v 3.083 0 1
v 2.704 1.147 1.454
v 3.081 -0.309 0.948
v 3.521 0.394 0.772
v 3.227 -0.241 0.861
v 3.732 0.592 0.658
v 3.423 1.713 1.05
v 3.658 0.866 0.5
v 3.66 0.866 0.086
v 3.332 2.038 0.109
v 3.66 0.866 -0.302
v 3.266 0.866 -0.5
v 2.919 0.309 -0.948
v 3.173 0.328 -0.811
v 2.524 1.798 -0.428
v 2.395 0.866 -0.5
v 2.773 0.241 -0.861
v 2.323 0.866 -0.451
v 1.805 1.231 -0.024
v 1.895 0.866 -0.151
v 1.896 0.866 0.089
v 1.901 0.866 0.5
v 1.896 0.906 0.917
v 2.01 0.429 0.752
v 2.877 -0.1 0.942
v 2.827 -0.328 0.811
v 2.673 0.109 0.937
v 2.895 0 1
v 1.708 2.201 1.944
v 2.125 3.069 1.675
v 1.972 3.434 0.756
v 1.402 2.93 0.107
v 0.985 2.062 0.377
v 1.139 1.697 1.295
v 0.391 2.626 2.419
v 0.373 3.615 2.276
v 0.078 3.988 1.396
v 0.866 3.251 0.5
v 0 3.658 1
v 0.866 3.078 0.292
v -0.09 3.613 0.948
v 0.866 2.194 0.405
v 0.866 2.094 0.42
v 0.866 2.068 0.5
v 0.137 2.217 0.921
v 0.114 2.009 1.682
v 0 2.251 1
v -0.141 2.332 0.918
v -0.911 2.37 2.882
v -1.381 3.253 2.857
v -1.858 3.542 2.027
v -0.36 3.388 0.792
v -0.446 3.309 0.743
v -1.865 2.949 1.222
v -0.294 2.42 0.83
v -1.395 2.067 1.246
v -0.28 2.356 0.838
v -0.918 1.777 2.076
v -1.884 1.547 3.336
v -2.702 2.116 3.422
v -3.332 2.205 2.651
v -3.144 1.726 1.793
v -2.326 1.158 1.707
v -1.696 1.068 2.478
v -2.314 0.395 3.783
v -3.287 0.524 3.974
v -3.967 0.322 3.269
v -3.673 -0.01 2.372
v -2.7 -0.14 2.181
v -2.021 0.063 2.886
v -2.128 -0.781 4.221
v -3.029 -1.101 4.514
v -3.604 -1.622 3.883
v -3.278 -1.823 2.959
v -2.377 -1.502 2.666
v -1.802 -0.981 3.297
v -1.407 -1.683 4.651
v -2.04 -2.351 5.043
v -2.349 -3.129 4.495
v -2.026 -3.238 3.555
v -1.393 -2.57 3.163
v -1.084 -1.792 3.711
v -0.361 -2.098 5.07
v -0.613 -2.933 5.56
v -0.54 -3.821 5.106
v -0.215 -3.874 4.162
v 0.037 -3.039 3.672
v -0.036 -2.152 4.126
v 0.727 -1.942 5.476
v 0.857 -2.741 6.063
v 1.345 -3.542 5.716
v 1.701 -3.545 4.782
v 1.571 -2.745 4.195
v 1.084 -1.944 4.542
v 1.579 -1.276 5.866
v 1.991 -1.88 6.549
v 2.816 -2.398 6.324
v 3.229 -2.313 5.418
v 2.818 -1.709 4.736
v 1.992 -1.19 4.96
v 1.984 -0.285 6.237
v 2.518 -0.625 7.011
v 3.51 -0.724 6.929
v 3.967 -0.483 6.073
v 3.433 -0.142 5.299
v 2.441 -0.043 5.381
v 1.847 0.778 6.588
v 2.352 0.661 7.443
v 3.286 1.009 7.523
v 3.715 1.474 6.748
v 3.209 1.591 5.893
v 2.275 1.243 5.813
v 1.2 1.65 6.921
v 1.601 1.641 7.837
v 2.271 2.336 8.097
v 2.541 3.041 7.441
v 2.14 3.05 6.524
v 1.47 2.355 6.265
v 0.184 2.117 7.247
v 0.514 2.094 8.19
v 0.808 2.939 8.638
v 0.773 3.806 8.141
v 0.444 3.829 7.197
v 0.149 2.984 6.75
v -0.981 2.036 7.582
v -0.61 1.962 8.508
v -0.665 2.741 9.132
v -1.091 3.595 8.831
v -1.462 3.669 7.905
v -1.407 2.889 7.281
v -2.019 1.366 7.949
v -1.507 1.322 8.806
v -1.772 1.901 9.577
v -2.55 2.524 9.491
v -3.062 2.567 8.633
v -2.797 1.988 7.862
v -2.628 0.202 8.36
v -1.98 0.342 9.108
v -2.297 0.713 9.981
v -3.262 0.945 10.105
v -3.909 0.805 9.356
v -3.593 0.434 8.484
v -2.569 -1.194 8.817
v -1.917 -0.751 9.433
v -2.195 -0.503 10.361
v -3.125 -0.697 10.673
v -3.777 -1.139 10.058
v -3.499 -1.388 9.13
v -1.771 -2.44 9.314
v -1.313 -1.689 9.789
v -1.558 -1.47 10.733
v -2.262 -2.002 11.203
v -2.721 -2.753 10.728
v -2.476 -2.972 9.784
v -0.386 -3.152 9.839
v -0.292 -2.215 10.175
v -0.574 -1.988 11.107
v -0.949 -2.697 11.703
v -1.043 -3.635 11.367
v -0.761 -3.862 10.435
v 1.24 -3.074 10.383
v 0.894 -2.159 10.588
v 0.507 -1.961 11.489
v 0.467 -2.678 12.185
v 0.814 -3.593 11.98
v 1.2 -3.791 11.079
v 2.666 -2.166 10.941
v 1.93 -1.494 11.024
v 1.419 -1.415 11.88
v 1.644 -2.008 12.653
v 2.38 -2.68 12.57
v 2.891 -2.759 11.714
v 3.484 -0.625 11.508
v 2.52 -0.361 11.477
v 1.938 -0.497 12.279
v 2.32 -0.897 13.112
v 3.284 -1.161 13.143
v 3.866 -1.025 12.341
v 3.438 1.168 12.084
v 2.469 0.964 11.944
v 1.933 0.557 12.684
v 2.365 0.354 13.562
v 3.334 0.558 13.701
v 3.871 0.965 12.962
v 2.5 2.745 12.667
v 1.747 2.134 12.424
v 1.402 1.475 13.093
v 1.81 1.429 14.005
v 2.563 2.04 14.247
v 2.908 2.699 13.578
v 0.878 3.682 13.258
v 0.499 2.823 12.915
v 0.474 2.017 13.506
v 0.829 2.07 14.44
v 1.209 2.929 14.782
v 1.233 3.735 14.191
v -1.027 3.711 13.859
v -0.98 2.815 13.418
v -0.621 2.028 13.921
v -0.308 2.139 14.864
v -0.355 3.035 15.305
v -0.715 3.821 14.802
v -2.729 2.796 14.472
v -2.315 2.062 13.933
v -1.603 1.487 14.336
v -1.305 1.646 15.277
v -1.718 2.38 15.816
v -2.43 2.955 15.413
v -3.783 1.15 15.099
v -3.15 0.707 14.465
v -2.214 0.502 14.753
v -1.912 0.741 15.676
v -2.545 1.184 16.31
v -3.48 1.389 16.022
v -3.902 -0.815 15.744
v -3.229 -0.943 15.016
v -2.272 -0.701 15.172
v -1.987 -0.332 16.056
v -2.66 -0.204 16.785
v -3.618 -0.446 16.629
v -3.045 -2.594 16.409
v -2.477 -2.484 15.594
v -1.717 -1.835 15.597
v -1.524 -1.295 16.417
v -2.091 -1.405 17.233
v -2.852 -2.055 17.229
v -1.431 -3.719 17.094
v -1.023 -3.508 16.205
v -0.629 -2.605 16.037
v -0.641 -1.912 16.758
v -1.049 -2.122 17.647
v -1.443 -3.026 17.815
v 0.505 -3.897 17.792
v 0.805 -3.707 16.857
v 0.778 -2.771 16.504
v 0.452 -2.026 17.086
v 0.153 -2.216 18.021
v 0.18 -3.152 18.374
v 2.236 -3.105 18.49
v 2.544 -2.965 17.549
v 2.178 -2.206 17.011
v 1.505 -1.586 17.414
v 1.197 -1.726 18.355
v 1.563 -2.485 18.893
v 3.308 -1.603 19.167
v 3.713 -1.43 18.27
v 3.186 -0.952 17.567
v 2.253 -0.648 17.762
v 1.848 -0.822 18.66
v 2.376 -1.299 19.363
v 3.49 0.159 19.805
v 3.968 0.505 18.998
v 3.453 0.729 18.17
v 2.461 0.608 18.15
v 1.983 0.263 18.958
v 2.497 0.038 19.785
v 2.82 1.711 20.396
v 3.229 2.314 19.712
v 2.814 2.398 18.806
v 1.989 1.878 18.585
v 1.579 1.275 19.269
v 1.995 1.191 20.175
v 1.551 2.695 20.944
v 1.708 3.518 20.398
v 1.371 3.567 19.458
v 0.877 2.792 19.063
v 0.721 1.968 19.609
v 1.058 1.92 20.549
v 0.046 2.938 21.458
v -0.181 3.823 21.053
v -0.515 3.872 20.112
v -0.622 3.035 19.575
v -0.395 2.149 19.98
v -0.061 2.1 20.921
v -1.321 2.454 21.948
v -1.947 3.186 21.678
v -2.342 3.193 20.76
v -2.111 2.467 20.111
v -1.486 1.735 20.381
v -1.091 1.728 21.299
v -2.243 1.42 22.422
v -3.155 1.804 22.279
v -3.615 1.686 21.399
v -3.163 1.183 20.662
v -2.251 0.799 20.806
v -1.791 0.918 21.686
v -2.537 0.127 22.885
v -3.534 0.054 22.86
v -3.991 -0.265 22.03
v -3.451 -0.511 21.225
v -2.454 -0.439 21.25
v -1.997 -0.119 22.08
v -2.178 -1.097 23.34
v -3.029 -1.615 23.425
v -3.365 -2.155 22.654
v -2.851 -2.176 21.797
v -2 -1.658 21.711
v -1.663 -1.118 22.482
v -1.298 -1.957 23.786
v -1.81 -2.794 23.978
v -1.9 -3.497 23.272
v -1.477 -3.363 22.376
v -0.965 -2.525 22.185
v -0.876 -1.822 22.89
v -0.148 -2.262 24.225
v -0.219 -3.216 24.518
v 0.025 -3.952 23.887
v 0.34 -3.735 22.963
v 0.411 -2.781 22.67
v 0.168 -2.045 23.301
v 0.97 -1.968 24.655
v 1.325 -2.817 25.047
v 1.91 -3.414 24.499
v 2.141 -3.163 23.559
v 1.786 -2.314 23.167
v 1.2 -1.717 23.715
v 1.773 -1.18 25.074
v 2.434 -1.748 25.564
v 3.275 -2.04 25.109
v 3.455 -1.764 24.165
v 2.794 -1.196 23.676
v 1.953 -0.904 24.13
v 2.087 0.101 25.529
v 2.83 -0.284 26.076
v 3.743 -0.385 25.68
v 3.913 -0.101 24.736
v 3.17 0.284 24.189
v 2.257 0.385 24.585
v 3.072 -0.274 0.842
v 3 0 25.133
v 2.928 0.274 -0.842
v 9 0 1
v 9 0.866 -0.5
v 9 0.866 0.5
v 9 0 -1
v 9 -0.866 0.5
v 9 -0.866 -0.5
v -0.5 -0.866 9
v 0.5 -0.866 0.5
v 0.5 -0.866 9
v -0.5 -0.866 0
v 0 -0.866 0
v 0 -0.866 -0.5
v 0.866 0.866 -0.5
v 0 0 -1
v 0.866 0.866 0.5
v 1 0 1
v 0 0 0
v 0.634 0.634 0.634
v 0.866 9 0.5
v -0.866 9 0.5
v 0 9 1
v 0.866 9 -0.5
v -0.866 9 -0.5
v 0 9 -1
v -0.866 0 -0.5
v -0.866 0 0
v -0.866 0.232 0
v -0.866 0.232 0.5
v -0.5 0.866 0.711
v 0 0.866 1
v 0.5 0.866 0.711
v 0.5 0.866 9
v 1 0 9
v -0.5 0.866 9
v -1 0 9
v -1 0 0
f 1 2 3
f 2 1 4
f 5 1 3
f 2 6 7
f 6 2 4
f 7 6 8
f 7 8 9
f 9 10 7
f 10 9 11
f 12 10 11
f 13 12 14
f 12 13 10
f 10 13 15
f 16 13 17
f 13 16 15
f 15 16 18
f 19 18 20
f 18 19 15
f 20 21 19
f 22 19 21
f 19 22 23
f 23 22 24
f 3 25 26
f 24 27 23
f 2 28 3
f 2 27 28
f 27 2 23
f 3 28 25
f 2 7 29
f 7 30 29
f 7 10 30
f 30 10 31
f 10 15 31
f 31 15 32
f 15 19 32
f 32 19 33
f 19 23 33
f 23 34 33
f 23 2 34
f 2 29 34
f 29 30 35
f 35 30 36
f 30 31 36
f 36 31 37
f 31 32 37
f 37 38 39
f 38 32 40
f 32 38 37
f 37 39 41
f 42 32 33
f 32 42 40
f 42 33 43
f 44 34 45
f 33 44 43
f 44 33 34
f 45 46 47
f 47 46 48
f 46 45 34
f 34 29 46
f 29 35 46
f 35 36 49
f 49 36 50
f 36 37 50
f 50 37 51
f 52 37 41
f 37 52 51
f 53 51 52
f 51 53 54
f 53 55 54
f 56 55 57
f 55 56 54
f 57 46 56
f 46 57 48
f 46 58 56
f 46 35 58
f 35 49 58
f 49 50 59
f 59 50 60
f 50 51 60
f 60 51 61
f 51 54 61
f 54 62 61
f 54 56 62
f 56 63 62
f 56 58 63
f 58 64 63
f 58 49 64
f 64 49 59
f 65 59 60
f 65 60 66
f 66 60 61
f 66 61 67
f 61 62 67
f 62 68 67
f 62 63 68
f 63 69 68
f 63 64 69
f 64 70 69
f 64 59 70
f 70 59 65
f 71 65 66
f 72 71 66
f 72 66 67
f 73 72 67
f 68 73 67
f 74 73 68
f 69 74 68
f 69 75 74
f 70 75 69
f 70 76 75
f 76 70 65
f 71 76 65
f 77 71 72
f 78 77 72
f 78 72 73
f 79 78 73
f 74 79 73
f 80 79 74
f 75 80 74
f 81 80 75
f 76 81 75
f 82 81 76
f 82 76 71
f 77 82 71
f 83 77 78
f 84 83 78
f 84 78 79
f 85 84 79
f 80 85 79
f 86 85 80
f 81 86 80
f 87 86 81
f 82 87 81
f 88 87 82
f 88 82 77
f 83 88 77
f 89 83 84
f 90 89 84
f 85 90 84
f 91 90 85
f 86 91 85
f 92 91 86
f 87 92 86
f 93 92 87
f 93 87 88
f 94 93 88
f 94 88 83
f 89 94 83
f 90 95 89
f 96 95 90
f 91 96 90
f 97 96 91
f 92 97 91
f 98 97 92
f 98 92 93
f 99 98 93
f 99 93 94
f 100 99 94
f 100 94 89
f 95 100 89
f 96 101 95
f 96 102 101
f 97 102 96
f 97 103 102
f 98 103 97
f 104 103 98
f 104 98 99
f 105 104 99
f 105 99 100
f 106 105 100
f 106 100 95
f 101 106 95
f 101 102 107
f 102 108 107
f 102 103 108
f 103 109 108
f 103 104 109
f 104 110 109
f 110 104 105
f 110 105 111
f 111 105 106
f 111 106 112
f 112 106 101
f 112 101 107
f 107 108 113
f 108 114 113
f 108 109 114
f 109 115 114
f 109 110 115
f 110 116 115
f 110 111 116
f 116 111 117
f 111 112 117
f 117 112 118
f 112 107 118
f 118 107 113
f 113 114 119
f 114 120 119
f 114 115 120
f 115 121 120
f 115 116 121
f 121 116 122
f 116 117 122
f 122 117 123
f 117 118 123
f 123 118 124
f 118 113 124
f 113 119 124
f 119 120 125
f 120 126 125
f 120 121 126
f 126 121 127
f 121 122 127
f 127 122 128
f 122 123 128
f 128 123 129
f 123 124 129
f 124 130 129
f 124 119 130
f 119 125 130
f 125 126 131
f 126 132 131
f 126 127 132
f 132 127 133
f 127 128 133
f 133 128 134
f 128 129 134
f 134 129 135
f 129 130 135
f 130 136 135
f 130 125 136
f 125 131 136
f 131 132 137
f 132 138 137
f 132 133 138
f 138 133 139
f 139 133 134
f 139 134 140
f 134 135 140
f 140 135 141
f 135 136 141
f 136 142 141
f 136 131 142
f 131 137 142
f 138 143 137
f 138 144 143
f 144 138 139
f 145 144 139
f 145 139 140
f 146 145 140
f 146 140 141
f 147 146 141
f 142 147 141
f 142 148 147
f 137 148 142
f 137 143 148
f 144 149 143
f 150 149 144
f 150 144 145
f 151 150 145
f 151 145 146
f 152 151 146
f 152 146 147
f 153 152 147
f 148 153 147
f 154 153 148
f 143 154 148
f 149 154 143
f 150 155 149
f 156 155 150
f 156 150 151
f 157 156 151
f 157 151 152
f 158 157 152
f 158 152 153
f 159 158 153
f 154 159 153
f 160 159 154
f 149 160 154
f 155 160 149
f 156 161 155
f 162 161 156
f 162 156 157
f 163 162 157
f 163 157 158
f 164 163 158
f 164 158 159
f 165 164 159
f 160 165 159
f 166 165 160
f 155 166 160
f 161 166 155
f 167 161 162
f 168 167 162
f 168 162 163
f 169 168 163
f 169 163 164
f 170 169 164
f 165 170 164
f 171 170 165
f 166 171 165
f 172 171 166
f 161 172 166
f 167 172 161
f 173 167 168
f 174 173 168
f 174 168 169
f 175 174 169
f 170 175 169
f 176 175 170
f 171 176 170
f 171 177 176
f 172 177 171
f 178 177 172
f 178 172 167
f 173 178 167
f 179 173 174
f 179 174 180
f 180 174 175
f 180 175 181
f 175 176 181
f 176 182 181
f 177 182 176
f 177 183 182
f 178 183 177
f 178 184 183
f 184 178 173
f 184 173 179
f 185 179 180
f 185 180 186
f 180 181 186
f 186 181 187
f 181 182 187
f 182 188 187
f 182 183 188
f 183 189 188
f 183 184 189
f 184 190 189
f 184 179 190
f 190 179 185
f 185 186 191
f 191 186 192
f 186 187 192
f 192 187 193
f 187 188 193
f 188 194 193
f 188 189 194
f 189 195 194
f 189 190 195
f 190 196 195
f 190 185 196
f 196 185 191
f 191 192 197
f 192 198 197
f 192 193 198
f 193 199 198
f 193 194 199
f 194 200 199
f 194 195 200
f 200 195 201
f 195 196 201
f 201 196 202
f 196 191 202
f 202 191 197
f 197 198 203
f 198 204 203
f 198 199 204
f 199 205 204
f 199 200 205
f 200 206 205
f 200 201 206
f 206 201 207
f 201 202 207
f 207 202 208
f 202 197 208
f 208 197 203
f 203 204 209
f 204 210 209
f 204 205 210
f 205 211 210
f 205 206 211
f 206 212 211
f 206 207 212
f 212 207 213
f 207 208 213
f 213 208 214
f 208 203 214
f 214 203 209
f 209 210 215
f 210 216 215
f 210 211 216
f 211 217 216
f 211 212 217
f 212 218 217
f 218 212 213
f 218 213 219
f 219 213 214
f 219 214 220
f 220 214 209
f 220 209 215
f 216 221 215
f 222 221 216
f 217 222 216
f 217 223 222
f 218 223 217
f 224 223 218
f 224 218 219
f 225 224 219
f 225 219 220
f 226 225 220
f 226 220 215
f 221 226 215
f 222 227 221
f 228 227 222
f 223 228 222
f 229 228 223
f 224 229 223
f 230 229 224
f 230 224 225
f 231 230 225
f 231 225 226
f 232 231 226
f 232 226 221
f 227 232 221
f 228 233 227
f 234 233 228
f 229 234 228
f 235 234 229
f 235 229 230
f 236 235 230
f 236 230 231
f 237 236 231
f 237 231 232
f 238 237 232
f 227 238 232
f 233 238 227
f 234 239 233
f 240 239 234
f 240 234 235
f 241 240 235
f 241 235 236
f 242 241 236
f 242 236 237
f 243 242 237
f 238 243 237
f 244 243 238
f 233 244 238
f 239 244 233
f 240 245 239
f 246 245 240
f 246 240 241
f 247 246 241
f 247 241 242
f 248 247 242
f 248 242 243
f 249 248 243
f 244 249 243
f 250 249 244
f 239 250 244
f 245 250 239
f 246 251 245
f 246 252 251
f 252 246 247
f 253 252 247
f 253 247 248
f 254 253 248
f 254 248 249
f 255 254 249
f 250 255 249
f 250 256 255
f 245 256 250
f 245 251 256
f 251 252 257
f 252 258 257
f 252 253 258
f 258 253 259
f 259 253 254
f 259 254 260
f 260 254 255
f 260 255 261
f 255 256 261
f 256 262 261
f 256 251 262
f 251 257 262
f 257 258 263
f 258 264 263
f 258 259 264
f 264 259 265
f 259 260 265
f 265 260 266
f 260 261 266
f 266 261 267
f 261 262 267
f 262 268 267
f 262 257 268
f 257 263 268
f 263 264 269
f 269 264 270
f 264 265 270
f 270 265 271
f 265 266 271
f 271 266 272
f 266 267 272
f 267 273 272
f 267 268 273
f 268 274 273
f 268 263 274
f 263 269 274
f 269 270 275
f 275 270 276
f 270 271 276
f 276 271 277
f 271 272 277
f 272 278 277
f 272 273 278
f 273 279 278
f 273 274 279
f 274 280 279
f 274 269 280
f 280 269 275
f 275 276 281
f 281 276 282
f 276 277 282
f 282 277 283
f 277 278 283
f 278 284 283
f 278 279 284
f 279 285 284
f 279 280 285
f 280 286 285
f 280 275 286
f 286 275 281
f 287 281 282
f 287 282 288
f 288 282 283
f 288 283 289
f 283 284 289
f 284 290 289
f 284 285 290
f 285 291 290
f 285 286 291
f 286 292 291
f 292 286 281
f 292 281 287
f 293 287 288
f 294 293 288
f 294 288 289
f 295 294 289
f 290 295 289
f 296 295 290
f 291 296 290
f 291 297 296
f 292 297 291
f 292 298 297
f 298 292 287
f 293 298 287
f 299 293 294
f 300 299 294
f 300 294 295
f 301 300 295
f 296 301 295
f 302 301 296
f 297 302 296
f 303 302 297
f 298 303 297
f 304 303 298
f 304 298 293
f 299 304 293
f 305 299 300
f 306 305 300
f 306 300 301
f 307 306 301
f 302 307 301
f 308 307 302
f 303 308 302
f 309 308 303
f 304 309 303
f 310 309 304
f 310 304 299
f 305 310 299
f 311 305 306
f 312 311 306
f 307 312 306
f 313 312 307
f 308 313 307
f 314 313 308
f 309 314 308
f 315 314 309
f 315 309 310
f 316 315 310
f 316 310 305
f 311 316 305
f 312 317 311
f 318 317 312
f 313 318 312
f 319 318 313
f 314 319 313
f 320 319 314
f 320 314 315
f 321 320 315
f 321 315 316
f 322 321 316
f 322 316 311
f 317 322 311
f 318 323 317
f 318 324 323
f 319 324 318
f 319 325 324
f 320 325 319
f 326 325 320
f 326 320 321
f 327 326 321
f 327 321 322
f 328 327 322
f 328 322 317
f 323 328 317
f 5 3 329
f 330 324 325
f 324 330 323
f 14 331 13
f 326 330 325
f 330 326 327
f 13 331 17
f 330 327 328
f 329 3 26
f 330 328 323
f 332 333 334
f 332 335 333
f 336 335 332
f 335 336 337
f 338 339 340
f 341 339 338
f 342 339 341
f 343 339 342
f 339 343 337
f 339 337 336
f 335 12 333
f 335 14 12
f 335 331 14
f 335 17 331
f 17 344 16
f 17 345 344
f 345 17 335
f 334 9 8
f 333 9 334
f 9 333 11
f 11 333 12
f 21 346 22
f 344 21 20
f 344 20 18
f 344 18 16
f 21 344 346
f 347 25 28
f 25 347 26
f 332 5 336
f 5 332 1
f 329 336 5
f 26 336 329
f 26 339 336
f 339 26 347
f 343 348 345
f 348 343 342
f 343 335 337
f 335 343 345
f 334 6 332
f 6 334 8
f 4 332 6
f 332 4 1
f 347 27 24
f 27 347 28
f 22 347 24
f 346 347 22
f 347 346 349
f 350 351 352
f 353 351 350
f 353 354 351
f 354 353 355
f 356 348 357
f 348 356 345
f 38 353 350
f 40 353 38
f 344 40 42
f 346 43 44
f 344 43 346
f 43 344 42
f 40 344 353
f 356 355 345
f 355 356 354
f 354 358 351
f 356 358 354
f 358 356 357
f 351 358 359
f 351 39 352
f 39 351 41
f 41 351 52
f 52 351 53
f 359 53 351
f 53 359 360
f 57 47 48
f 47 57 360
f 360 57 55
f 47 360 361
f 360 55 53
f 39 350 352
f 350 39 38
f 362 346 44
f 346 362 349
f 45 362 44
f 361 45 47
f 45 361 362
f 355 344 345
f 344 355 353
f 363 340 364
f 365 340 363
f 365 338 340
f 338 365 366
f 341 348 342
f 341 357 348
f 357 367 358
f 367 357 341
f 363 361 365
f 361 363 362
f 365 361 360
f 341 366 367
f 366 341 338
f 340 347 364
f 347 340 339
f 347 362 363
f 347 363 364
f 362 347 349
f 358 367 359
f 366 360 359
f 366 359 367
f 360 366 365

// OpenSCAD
union() {
	polyhedron(convexity = 10, faces = [[0, 6, 1], [1, 6, 7], [1, 7, 2], [2, 7, 8], [2, 8, 3], [3, 8, 9], [3, 9, 4], [4, 9, 10], [4, 10, 5], [5, 10, 11], [5, 11, 0], [0, 11, 6], [6, 12, 7], [7, 12, 13], [7, 13, 8], [8, 13, 14], [8, 14, 9], [9, 14, 15], [9, 15, 10], [10, 15, 16], [10, 16, 11], [11, 16, 17], [11, 17, 6], [6, 17, 12], [12, 18, 13], [13, 18, 19], [13, 19, 14], [14, 19, 20], [14, 20, 15], [15, 20, 21], [15, 21, 16], [16, 21, 22], [16, 22, 17], [17, 22, 23], [17, 23, 12], [12, 23, 18], [18, 24, 19], [19, 24, 25], [19, 25, 20], [20, 25, 26], [20, 26, 21], [21, 26, 27], [21, 27, 22], [22, 27, 28], [22, 28, 23], [23, 28, 29], [23, 29, 18], [18, 29, 24], [24, 30, 25], [25, 30, 31], [25, 31, 26], [26, 31, 32], [26, 32, 27], [27, 32, 33], [27, 33, 28], [28, 33, 34], [28, 34, 29], [29, 34, 35], [29, 35, 24], [24, 35, 30], [30, 36, 31], [31, 36, 37], [31, 37, 32], [32, 37, 38], [32, 38, 33], [33, 38, 39], [33, 39, 34], [34, 39, 40], [34, 40, 35], [35, 40, 41], [35, 41, 30], [30, 41, 36], [36, 42, 37], [37, 42, 43], [37, 43, 38], [38, 43, 44], [38, 44, 39], [39, 44, 45], [39, 45, 40], [40, 45, 46], [40, 46, 41], [41, 46, 47], [41, 47, 36], [36, 47, 42], [42, 48, 43], [43, 48, 49], [43, 49, 44], [44, 49, 50], [44, 50, 45], [45, 50, 51], [45, 51, 46], [46, 51, 52], [46, 52, 47], [47, 52, 53], [47, 53, 42], [42, 53, 48], [48, 54, 49], [49, 54, 55], [49, 55, 50], [50, 55, 56], [50, 56, 51], [51, 56, 57], [51, 57, 52], [52, 57, 58], [52, 58, 53], [53, 58, 59], [53, 59, 48], [48, 59, 54], [54, 60, 55], [55, 60, 61], [55, 61, 56], [56, 61, 62], [56, 62, 57], [57, 62, 63], [57, 63, 58], [58, 63, 64], [58, 64, 59], [59, 64, 65], [59, 65, 54], [54, 65, 60], [60, 66, 61], [61, 66, 67], [61, 67, 62], [62, 67, 68], [62, 68, 63], [63, 68, 69], [63, 69, 64], [64, 69, 70], [64, 70, 65], [65, 70, 71], [65, 71, 60], [60, 71, 66], [66, 72, 67], [67, 72, 73], [67, 73, 68], [68, 73, 74], [68, 74, 69], [69, 74, 75], [69, 75, 70], [70, 75, 76], [70, 76, 71], [71, 76, 77], [71, 77, 66], [66, 77, 72], [72, 78, 73], [73, 78, 79], [73, 79, 74], [74, 79, 80], [74, 80, 75], [75, 80, 81], [75, 81, 76], [76, 81, 82], [76, 82, 77], [77, 82, 83], [77, 83, 72], [72, 83, 78], [78, 84, 79], [79, 84, 85], [79, 85, 80], [80, 85, 86], [80, 86, 81], [81, 86, 87], [81, 87, 82], [82, 87, 88], [82, 88, 83], [83, 88, 89], [83, 89, 78], [78, 89, 84], [84, 90, 85], [85, 90, 91], [85, 91, 86], [86, 91, 92], [86, 92, 87], [87, 92, 93], [87, 93, 88], [88, 93, 94], [88, 94, 89], [89, 94, 95], [89, 95, 84], [84, 95, 90], [90, 96, 91], [91, 96, 97], [91, 97, 92], [92, 97, 98], [92, 98, 93], [93, 98, 99], [93, 99, 94], [94, 99, 100], [94, 100, 95], [95, 100, 101], [95, 101, 90], [90, 101, 96], [96, 102, 97], [97, 102, 103], [97, 103, 98], [98, 103, 104], [98, 104, 99], [99, 104, 105], [99, 105, 100], [100, 105, 106], [100, 106, 101], [101, 106, 107], [101, 107, 96], [96, 107, 102], [102, 108, 103], [103, 108, 109], [103, 109, 104], [104, 109, 110], [104, 110, 105], [105, 110, 111], [105, 111, 106], [106, 111, 112], [106, 112, 107], [107, 112, 113], [107, 113, 102], [102, 113, 108], [108, 114, 109], [109, 114, 115], [109, 115, 110], [110, 115, 116], [110, 116, 111], [111, 116, 117], [111, 117, 112], [112, 117, 118], [112, 118, 113], [113, 118, 119], [113, 119, 108], [108, 119, 114], [114, 120, 115], [115, 120, 121], [115, 121, 116], [116, 121, 122], [116, 122, 117], [117, 122, 123], [117, 123, 118], [118, 123, 124], [118, 124, 119], [119, 124, 125], [119, 125, 114], [114, 125, 120], [120, 126, 121], [121, 126, 127], [121, 127, 122], [122, 127, 128], [122, 128, 123], [123, 128, 129], [123, 129, 124], [124, 129, 130], [124, 130, 125], [125, 130, 131], [125, 131, 120], [120, 131, 126], [126, 132, 127], [127, 132, 133], [127, 133, 128], [128, 133, 134], [128, 134, 129], [129, 134, 135], [129, 135, 130], [130, 135, 136], [130, 136, 131], [131, 136, 137], [131, 137, 126], [126, 137, 132], [132, 138, 133], [133, 138, 139], [133, 139, 134], [134, 139, 140], [134, 140, 135], [135, 140, 141], [135, 141, 136], [136, 141, 142], [136, 142, 137], [137, 142, 143], [137, 143, 132], [132, 143, 138], [138, 144, 139], [139, 144, 145], [139, 145, 140], [140, 145, 146], [140, 146, 141], [141, 146, 147], [141, 147, 142], [142, 147, 148], [142, 148, 143], [143, 148, 149], [143, 149, 138], [138, 149, 144], [144, 150, 145], [145, 150, 151], [145, 151, 146], [146, 151, 152], [146, 152, 147], [147, 152, 153], [147, 153, 148], [148, 153, 154], [148, 154, 149], [149, 154, 155], [149, 155, 144], [144, 155, 150], [150, 156, 151], [151, 156, 157], [151, 157, 152], [152, 157, 158], [152, 158, 153], [153, 158, 159], [153, 159, 154], [154, 159, 160], [154, 160, 155], [155, 160, 161], [155, 161, 150], [150, 161, 156], [156, 162, 157], [157, 162, 163], [157, 163, 158], [158, 163, 164], [158, 164, 159], [159, 164, 165], [159, 165, 160], [160, 165, 166], [160, 166, 161], [161, 166, 167], [161, 167, 156], [156, 167, 162], [162, 168, 163], [163, 168, 169], [163, 169, 164], [164, 169, 170], [164, 170, 165], [165, 170, 171], [165, 171, 166], [166, 171, 172], [166, 172, 167], [167, 172, 173], [167, 173, 162], [162, 173, 168], [168, 174, 169], [169, 174, 175], [169, 175, 170], [170, 175, 176], [170, 176, 171], [171, 176, 177], [171, 177, 172], [172, 177, 178], [172, 178, 173], [173, 178, 179], [173, 179, 168], [168, 179, 174], [174, 180, 175], [175, 180, 181], [175, 181, 176], [176, 181, 182], [176, 182, 177], [177, 182, 183], [177, 183, 178], [178, 183, 184], [178, 184, 179], [179, 184, 185], [179, 185, 174], [174, 185, 180], [180, 186, 181], [181, 186, 187], [181, 187, 182], [182, 187, 188], [182, 188, 183], [183, 188, 189], [183, 189, 184], [184, 189, 190], [184, 190, 185], [185, 190, 191], [185, 191, 180], [180, 191, 186], [186, 192, 187], [187, 192, 193], [187, 193, 188], [188, 193, 194], [188, 194, 189], [189, 194, 195], [189, 195, 190], [190, 195, 196], [190, 196, 191], [191, 196, 197], [191, 197, 186], [186, 197, 192], [192, 198, 193], [193, 198, 199], [193, 199, 194], [194, 199, 200], [194, 200, 195], [195, 200, 201], [195, 201, 196], [196, 201, 202], [196, 202, 197], [197, 202, 203], [197, 203, 192], [192, 203, 198], [198, 204, 199], [199, 204, 205], [199, 205, 200], [200, 205, 206], [200, 206, 201], [201, 206, 207], [201, 207, 202], [202, 207, 208], [202, 208, 203], [203, 208, 209], [203, 209, 198], [198, 209, 204], [204, 210, 205], [205, 210, 211], [205, 211, 206], [206, 211, 212], [206, 212, 207], [207, 212, 213], [207, 213, 208], [208, 213, 214], [208, 214, 209], [209, 214, 215], [209, 215, 204], [204, 215, 210], [210, 216, 211], [211, 216, 217], [211, 217, 212], [212, 217, 218], [212, 218, 213], [213, 218, 219], [213, 219, 214], [214, 219, 220], [214, 220, 215], [215, 220, 221], [215, 221, 210], [210, 221, 216], [216, 222, 217], [217, 222, 223], [217, 223, 218], [218, 223, 224], [218, 224, 219], [219, 224, 225], [219, 225, 220], [220, 225, 226], [220, 226, 221], [221, 226, 227], [221, 227, 216], [216, 227, 222], [222, 228, 223], [223, 228, 229], [223, 229, 224], [224, 229, 230], [224, 230, 225], [225, 230, 231], [225, 231, 226], [226, 231, 232], [226, 232, 227], [227, 232, 233], [227, 233, 222], [222, 233, 228], [228, 234, 229], [229, 234, 235], [229, 235, 230], [230, 235, 236], [230, 236, 231], [231, 236, 237], [231, 237, 232], [232, 237, 238], [232, 238, 233], [233, 238, 239], [233, 239, 228], [228, 239, 234], [234, 240, 235], [235, 240, 241], [235, 241, 236], [236, 241, 242], [236, 242, 237], [237, 242, 243], [237, 243, 238], [238, 243, 244], [238, 244, 239], [239, 244, 245], [239, 245, 234], [234, 245, 240], [240, 246, 241], [241, 246, 247], [241, 247, 242], [242, 247, 248], [242, 248, 243], [243, 248, 249], [243, 249, 244], [244, 249, 250], [244, 250, 245], [245, 250, 251], [245, 251, 240], [240, 251, 246], [246, 252, 247], [247, 252, 253], [247, 253, 248], [248, 253, 254], [248, 254, 249], [249, 254, 255], [249, 255, 250], [250, 255, 256], [250, 256, 251], [251, 256, 257], [251, 257, 246], [246, 257, 252], [252, 258, 253], [253, 258, 259], [253, 259, 254], [254, 259, 260], [254, 260, 255], [255, 260, 261], [255, 261, 256], [256, 261, 262], [256, 262, 257], [257, 262, 263], [257, 263, 252], [252, 263, 258], [258, 264, 259], [259, 264, 265], [259, 265, 260], [260, 265, 266], [260, 266, 261], [261, 266, 267], [261, 267, 262], [262, 267, 268], [262, 268, 263], [263, 268, 269], [263, 269, 258], [258, 269, 264], [264, 270, 265], [265, 270, 271], [265, 271, 266], [266, 271, 272], [266, 272, 267], [267, 272, 273], [267, 273, 268], [268, 273, 274], [268, 274, 269], [269, 274, 275], [269, 275, 264], [264, 275, 270], [270, 276, 271], [271, 276, 277], [271, 277, 272], [272, 277, 278], [272, 278, 273], [273, 278, 279], [273, 279, 274], [274, 279, 280], [274, 280, 275], [275, 280, 281], [275, 281, 270], [270, 281, 276], [276, 282, 277], [277, 282, 283], [277, 283, 278], [278, 283, 284], [278, 284, 279], [279, 284, 285], [279, 285, 280], [280, 285, 286], [280, 286, 281], [281, 286, 287], [281, 287, 276], [276, 287, 282], [282, 288, 283], [283, 288, 289], [283, 289, 284], [284, 289, 290], [284, 290, 285], [285, 290, 291], [285, 291, 286], [286, 291, 292], [286, 292, 287], [287, 292, 293], [287, 293, 282], [282, 293, 288], [288, 294, 289], [289, 294, 295], [289, 295, 290], [290, 295, 296], [290, 296, 291], [291, 296, 297], [291, 297, 292], [292, 297, 298], [292, 298, 293], [293, 298, 299], [293, 299, 288], [288, 299, 294], [1, 300, 0], [294, 301, 295], [2, 300, 1], [295, 301, 296], [3, 300, 2], [296, 301, 297], [4, 300, 3], [297, 301, 298], [5, 300, 4], [298, 301, 299], [0, 300, 5], [299, 301, 294]], points = [[3.0810087502, -0.3089214740, 0.9476313129], [3.8782062995, 0.0652105764, 0.4738156565], [3.7971975492, 0.3741320505, -0.4738156565], [2.9189912498, 0.3089214740, -0.9476313129], [2.1217937005, -0.0652105764, -0.4738156565], [2.2028024508, -0.3741320505, 0.4738156565], [2.7042789242, 1.1466598966, 1.4541337051], [3.4225496959, 1.7128669475, 1.0497864854], [3.3322268841, 2.0383597069, 0.1085658666], [2.5236333006, 1.7976454154, -0.4283075325], [1.8053625289, 1.2314383645, -0.0239603128], [1.8956853407, 0.9059456052, 0.9172603060], [1.7084601032, 2.2009545168, 1.9443376727], [2.1250694272, 3.0692223543, 1.6749909935], [1.9717870289, 3.4336961265, 0.7564794935], [1.4018953066, 2.9299020612, 0.1073146725], [0.9852859827, 2.0616342237, 0.3766613517], [1.1385683810, 1.6971604515, 1.2951728517], [0.3908859976, 2.6255273844, 2.4185436426], [0.3728424364, 3.6151148193, 2.2757460986], [0.0781111715, 3.9880460835, 1.3959417149], [-0.1985765322, 3.3713899129, 0.6589348752], [-0.1805329710, 2.3818024779, 0.8017324192], [0.1141982939, 2.0088712137, 1.6815368029], [-0.9105575634, 2.3704884403, 2.8815417059], [-1.3805732027, 3.2528003168, 2.8568222473], [-1.8576305099, 3.5421097955, 2.0269328866], [-1.8646721780, 2.9491073979, 1.2217629845], [-1.3946565388, 2.0667955215, 1.2464824431], [-0.9175992315, 1.7774860427, 2.0763718038], [-1.8841579039, 1.5471102404, 3.3358997637], [-2.7023811781, 2.1155218530, 3.4220328710], [-3.3324875889, 2.2050163162, 2.6506985387], [-3.1443707255, 1.7260991669, 1.7932310993], [-2.3261474512, 1.1576875543, 1.7070979920], [-1.6960410404, 1.0681930911, 2.4784323243], [-2.3142796550, 0.3947547144, 3.7825876141], [-3.2872298728, 0.5240567863, 3.9740265023], [-3.9667863960, 0.3215127318, 3.2689174060], [-3.6733927015, -0.0103333946, 2.3723694215], [-2.7004424837, -0.1396354664, 2.1809305333], [-2.0208859605, 0.0629085881, 2.8860396296], [-2.1280235244, -0.7807782906, 4.2214231717], [-3.0288365899, -1.1013231042, 4.5143170834], [-3.6037196692, -1.6221960310, 3.8832855158], [-3.2777896831, -1.8225241441, 2.9593600365], [-2.3769766176, -1.5019793305, 2.6664661248], [-1.8020935382, -0.9811064037, 3.2974976924], [-1.4070349128, -1.6833494561, 4.6513331247], [-2.0395463274, -2.3513862460, 5.0433231218], [-2.3488613950, -3.1285535537, 4.4952946875], [-2.0256650480, -3.2376840715, 3.5552762561], [-1.3931536334, -2.5696472816, 3.1632862590], [-1.0838385658, -1.7924799739, 3.7113146933], [-0.3614283609, -2.0983000193, 5.0704900625], [-0.6133965364, -2.9329128470, 5.5603201007], [-0.5400372532, -3.8207501666, 5.1060478149], [-0.2147097945, -3.8739746584, 4.1619454910], [0.0372583810, -3.0393618307, 3.6721154528], [-0.0361009022, -2.1515245111, 4.1263877385], [0.7272916681, -1.9418848301, 5.4764167102], [0.8574526973, -2.7410463178, 6.0632719077], [1.3445110585, -3.5423993568, 5.7159860606], [1.7014083906, -3.5445909080, 4.7818450158], [1.5712473614, -2.7454294202, 4.1949898183], [1.0841890002, -1.9440763813, 4.5422756654], [1.5790211108, -1.2759049545, 5.8662005428], [1.9908270723, -1.8798950131, 6.5485581171], [2.8160468271, -2.3983216501, 6.3244015236], [3.2294606204, -2.3127582284, 5.4178873558], [2.8176546589, -1.7087681699, 4.7355297815], [1.9924349041, -1.1903415329, 4.9596863750], [1.9836783537, -0.2846141680, 6.2370738259], [2.5179154344, -0.6252765683, 7.0107274115], [3.5096071223, -0.7242938854, 6.9286106212], [3.9670617293, -0.4826488021, 6.0728402453], [3.4328246485, -0.1419864018, 5.2991866597], [2.4411329607, -0.0429690847, 5.3813034500], [1.8467009739, 0.7777563961, 6.5877648648], [2.3521720183, 0.6610528434, 7.4426796583], [3.2862213164, 1.0090974619, 7.5227849154], [3.7147995701, 1.4738456332, 6.7479753790], [3.2093285258, 1.5905491859, 5.8930605855], [2.2752792277, 1.2425045674, 5.8129553284], [1.2002707150, 1.6502689215, 6.9209848572], [1.6009928273, 1.6408073885, 7.8371356461], [2.2711915179, 2.3360329144, 8.0969339971], [2.5406680962, 3.0407199733, 7.4405815592], [2.1399459838, 3.0501815063, 6.5244307703], [1.4697472932, 2.3549559804, 6.2646324193], [0.1844237277, 2.1169316801, 7.2465156331], [0.5139032279, 2.0943399625, 8.1904080387], [0.8082791852, 2.9389536327, 8.6375887001], [0.7731756425, 3.8061590204, 8.1408769559], [0.4436961423, 3.8287507380, 7.1969845503], [0.1493201850, 2.9841370678, 6.7498038889], [-0.9812150916, 2.0362936917, 7.5821309326], [-0.6102807221, 1.9622064639, 8.5078300069], [-0.6651607937, 2.7413180384, 9.1323084551], [-1.0909752349, 3.5945168406, 8.8310878290], [-1.4619096045, 3.6686040684, 7.9053887547], [-1.4070295328, 2.8894924939, 7.2809103065], [-2.0187912179, 1.3658440583, 7.9485309485], [-1.5065230925, 1.3222038515, 8.8062470437], [-1.7720697497, 1.9010449791, 9.5772385623], [-2.5498845323, 2.5235263136, 9.4905139857], [-3.0621526577, 2.5671665204, 8.6327978905], [-2.7966060005, 1.9883253927, 7.8618063719], [-2.6278542709, 0.2019997867, 8.3597222170], [-1.9798678402, 0.3415788220, 9.1084753663], [-2.2966910403, 0.7130549214, 9.9811887027], [-3.2615006711, 0.9449519855, 10.1051488898], [-3.9094871018, 0.8053729502, 9.3563957405], [-3.5926639017, 0.4338968508, 8.4836824041], [-2.5692831603, -1.1937206170, 8.8174047388], [-1.9172278847, -0.7512143391, 9.4330443344], [-2.1951119655, -0.5028183762, 10.3609882353], [-3.1250513218, -0.6969286911, 10.6732925406], [-3.7771065974, -1.1394349690, 10.0576529450], [-3.4992225166, -1.3878309319, 9.1297090441], [-1.7713643869, -2.4398500288, 9.3139403154], [-1.3125271358, -1.6886814990, 9.7885077151], [-1.5580654196, -1.4696654615, 10.7328291257], [-2.2624409547, -2.0018179537, 11.2025831366], [-2.7212782058, -2.7529864834, 10.7280157369], [-2.4757399219, -2.9720025210, 9.7836943263], [-0.3862622000, -3.1520839434, 9.8388633904], [-0.2924852304, -2.2149447336, 10.1749823893], [-0.5737858323, -1.9876445267, 11.1072938112], [-0.9488634037, -2.6974835297, 11.7034862342], [-1.0426403733, -3.6346227395, 11.3673672353], [-0.7613397715, -3.8619229464, 10.4350558134], [1.2398024533, -3.0741733191, 10.3832199312], [0.8935352906, -2.1587538443, 10.5884179755], [0.5073155973, -1.9605840844, 11.4892859429], [0.4673630665, -2.6778337991, 12.1849558660], [0.8136302292, -3.5932532739, 11.9797578217], [1.1998499225, -3.7914230338, 11.0788898543], [2.6656848600, -2.1663344377, 10.9408680197], [1.9300027402, -1.4941086746, 11.0238399553], [1.4193659305, -1.4148218887, 11.8799729205], [1.6444112406, -2.0077608659, 12.6531339501], [2.3800933604, -2.6799866290, 12.5701620145], [2.8907301701, -2.7592734149, 11.7140290493], [3.4838924912, -0.6248177692, 11.5082089675], [2.5198965339, -0.3607506131, 11.4768987236], [1.9378886318, -0.4968965956, 12.2786038273], [2.3198766870, -0.8971097343, 13.1116191749], [3.2838726443, -1.1611768904, 13.1429294188], [3.8658805464, -1.0250309078, 12.3412243151], [3.4383817385, 1.1679340719, 12.0835396848], [2.4693505687, 0.9639561436, 11.9443578012], [1.9328534193, 0.5569858234, 12.6836452739], [2.3653874398, 0.3539934316, 13.5621146302], [3.3344186096, 0.5579713599, 13.7012965138], [3.8709157589, 0.9649416800, 12.9620090411], [2.4996481653, 2.7453622727, 12.6665073840], [1.7466159555, 2.1336423219, 12.4241415598], [1.4020158405, 1.4753277010, 13.0933744196], [1.8104479353, 1.4287330309, 14.0049731036], [2.5634801451, 2.0404529817, 14.2473389278], [2.9080802601, 2.6987676026, 13.5781060680], [0.8781620562, 3.6823796532, 13.2577612477], [0.4986146025, 2.8229309274, 12.9152826090], [0.4740353062, 2.0165548332, 13.5061746914], [0.8290034635, 2.0696274650, 14.4395454125], [1.2085509173, 2.9290761909, 14.7820240512], [1.2331302136, 3.7354522850, 14.1911319688], [-1.0267083151, 3.7110426523, 13.8587628587], [-0.9796668448, 2.8146925327, 13.4179187103], [-0.6205213316, 2.0284336169, 13.9207222681], [-0.3084172886, 2.1385248208, 14.8643699742], [-0.3554587589, 3.0348749404, 15.3052141225], [-0.7146042722, 3.8211338562, 14.8024105648], [-2.7288656139, 2.7960387479, 14.4716789870], [-2.3153136740, 2.0617162718, 13.9333990468], [-1.6033507309, 1.4865115151, 14.3361995625], [-1.3049397277, 1.6456292345, 15.2772800185], [-1.7184916676, 2.3799517107, 15.8155599586], [-2.4304546107, 2.9551564674, 15.4127594429], [-3.7825963790, 1.1501261680, 15.0992456339], [-3.1495921505, 0.7069353844, 14.4645113777], [-2.2141630125, 0.5021338704, 14.7526583328], [-1.9117381031, 0.7405231401, 15.6755395442], [-2.5447423316, 1.1837139237, 16.3102738004], [-3.4801714695, 1.3885154377, 16.0221268452], [-3.9023864615, -0.8153248015, 15.7444127903], [-3.2294814414, -0.9429126181, 15.0157700912], [-2.2717724508, -0.7010637027, 15.1716629762], [-1.9869684805, -0.3316269707, 16.0561985603], [-2.6598735006, -0.2040391541, 16.7848412594], [-3.6175824911, -0.4458880695, 16.6289483744], [-3.0449238873, -2.5939113601, 16.4094381720], [-2.4772904523, -2.4840103973, 15.5935251486], [-1.7167044401, -1.8347842232, 15.5973057381], [-1.5237518629, -1.2954590118, 16.4169993512], [-2.0913852979, -1.4053599745, 17.2329123747], [-2.8519713101, -2.0545861486, 17.2291317851], [-1.4308452900, -3.7187301230, 17.0939905400], [-1.0234933549, -3.5083748261, 16.2052751469], [-0.6287432282, -2.6050499693, 16.0374164547], [-0.6413450366, -1.9120804093, 16.7582731558], [-1.0486969716, -2.1224357062, 17.6469885490], [-1.4434470983, -3.0257605630, 17.8148472411], [0.5053600798, -3.8967394552, 17.7921830537], [0.8046402943, -3.7066724020, 16.8571398095], [0.7780798996, -2.7714782970, 16.5040016901], [0.4522392904, -2.0263512452, 17.0859068148], [0.1529590759, -2.2164182985, 18.0209500589], [0.1795194706, -3.1516124035, 18.3740881784], [2.2362527122, -3.1048677270, 18.4900609798], [2.5441084386, -2.9650146095, 17.5489627080], [2.1783251320, -2.2056413299, 17.0108597487], [1.5046860989, -1.5861211678, 17.4138550612], [1.1968303726, -1.7259742853, 18.3549533330], [1.5626136792, -2.4853475649, 18.8930562924], [3.3083818233, -1.6034566208, 19.1673311185], [3.7131600226, -1.4298719064, 18.2695433060], [3.1855284714, -0.9522163002, 17.5670832943], [2.2531187208, -0.6481454084, 17.7624110951], [1.8483405214, -0.8217301229, 18.6601989076], [2.3759720727, -1.2993857291, 19.3626589193], [3.4897639277, 0.1592010511, 19.8054495302], [3.9678304661, 0.5045408236, 18.9978649672], [3.4534365799, 0.7289712576, 18.1701996301], [2.4609761553, 0.6080619191, 18.1501188561], [1.9829096169, 0.2627221465, 18.9577034191], [2.4973035031, 0.0382917125, 19.7853687561], [2.8198261940, 1.7107406479, 20.3964021922], [3.2294539742, 2.3139673707, 19.7120611933], [2.8138686458, 2.3975583142, 18.8063562806], [1.9886555372, 1.8779225350, 18.5849923667], [1.5790277570, 1.2746958123, 19.2693333655], [1.9946130854, 1.1911048687, 20.1750382782], [1.5512366706, 2.6949197435, 20.9439149705], [1.7078352956, 3.5182435633, 20.3983741760], [1.3709486544, 3.5665616889, 19.4580695713], [0.8774633881, 2.7915559946, 19.0633057610], [0.7208647631, 1.9682321748, 19.6088465554], [1.0577514043, 1.9199140492, 20.5491511601], [0.0460864033, 2.9375554000, 21.4577885102], [-0.1810649298, 3.8232772191, 21.0529439337], [-0.5152204108, 3.8718591579, 20.1116788756], [-0.6222245587, 3.0347192777, 19.5752583938], [-0.3950732257, 2.1489974586, 19.9801029703], [-0.0609177447, 2.1004155198, 20.9213680285], [-1.3212807935, 2.4535840171, 21.9480617473], [-1.9466488158, 3.1857820119, 21.6782452669], [-2.3417180027, 3.1927147586, 20.7596200579], [-2.1114191672, 2.4674495105, 20.1108113293], [-1.4860511449, 1.7352515157, 20.3806278097], [-1.0909819581, 1.7283187690, 21.2992530187], [-2.2429611217, 1.4204412294, 22.4223150141], [-3.1551582833, 1.8043420252, 22.2790791340], [-3.6151037653, 1.6855520132, 21.3991137445], [-3.1628520857, 1.1828612054, 20.6623842351], [-2.2506549241, 0.7989604095, 20.8056201152], [-1.7907094421, 0.9177504215, 21.6855855047], [-2.5365681527, 0.1269524369, 22.8853475683], [-3.5335991930, 0.0541676273, 22.8602183789], [-3.9908672186, -0.2649954695, 22.0301335216], [-3.4511042038, -0.5113737568, 21.2251778536], [-2.4540731635, -0.4385889472, 21.2503070429], [-1.9968051379, -0.1194258503, 22.0803919002], [-2.1776969788, -1.0967711834, 23.3397340898], [-3.0286207468, -1.6150146556, 23.4254804867], [-3.3651880827, -2.1548481758, 22.6539221940], [-2.8508316505, -2.1764382238, 21.7966175046], [-1.9999078825, -1.6581947516, 21.7108711078], [-1.6633405467, -1.1183612314, 22.4824294004], [-1.2979663237, -1.9566407698, 23.7864491896], [-1.8099590185, -2.7941108449, 23.9775181662], [-1.8996075655, -3.4972679942, 23.2721578601], [-1.4772634177, -3.3629550684, 22.3757285774], [-0.9652707230, -2.5254849933, 22.1846596009], [-0.8756221760, -1.8223278440, 22.8900199069], [-0.1475241757, -2.2622078319, 24.2253143525], [-0.2189191108, -3.2157937233, 24.5178493265], [0.0247597976, -3.9520445400, 23.8865369438], [0.3398336411, -3.7347094653, 22.9626895871], [0.4112285762, -2.7811235739, 22.6701546131], [0.1675496678, -2.0448727572, 23.3014669958], [0.9697611879, -1.9682631225, 24.6552591684], [1.3247857761, -2.8171316652, 25.0468964227], [1.9102022931, -3.4142968317, 24.4985523105], [2.1405942220, -3.1625934556, 23.5585709438], [1.7855696337, -2.3137249129, 23.1669336895], [1.2001531167, -1.7165597463, 23.7152778018], [1.7725320943, -1.1800625600, 25.0744587591], [2.4339754140, -1.7483068469, 25.5639392646], [3.2753994320, -2.0403969429, 25.1093086479], [3.4553801304, -1.7642427521, 24.1651975257], [2.7939368107, -1.1959984652, 23.6757170202], [1.9525127927, -0.9039083691, 24.1303476369], [2.0874521450, 0.1012441968, 25.5289810866], [2.8302721185, -0.2842540776, 26.0763471134], [3.7428199735, -0.3854982744, 25.6801072556], [3.9125478550, -0.1012441968, 24.7365013709], [3.1697278815, 0.2842540776, 24.1891353440], [2.2571800265, 0.3854982744, 24.5853752019], [3.0000000000, -0.0000000000, -0.0000000000], [3.0000000000, -0.0000000000, 25.1327412287]]);
	polyhedron(convexity = 10, faces = [[0, 6, 1], [1, 6, 7], [1, 7, 2], [2, 7, 8], [2, 8, 3], [3, 8, 9], [3, 9, 4], [4, 9, 10], [4, 10, 5], [5, 10, 11], [5, 11, 0], [0, 11, 6], [6, 12, 7], [7, 12, 13], [7, 13, 8], [8, 13, 14], [8, 14, 9], [9, 14, 15], [9, 15, 10], [10, 15, 16], [10, 16, 11], [11, 16, 17], [11, 17, 6], [6, 17, 12], [12, 18, 13], [13, 18, 19], [13, 19, 14], [14, 19, 20], [14, 20, 15], [15, 20, 21], [15, 21, 16], [16, 21, 22], [16, 22, 17], [17, 22, 23], [17, 23, 12], [12, 23, 18], [18, 24, 19], [19, 24, 25], [19, 25, 20], [20, 25, 26], [20, 26, 21], [21, 26, 27], [21, 27, 22], [22, 27, 28], [22, 28, 23], [23, 28, 29], [23, 29, 18], [18, 29, 24], [24, 30, 25], [25, 30, 31], [25, 31, 26], [26, 31, 32], [26, 32, 27], [27, 32, 33], [27, 33, 28], [28, 33, 34], [28, 34, 29], [29, 34, 35], [29, 35, 24], [24, 35, 30], [30, 36, 31], [31, 36, 37], [31, 37, 32], [32, 37, 38], [32, 38, 33], [33, 38, 39], [33, 39, 34], [34, 39, 40], [34, 40, 35], [35, 40, 41], [35, 41, 30], [30, 41, 36], [36, 42, 37], [37, 42, 43], [37, 43, 38], [38, 43, 44], [38, 44, 39], [39, 44, 45], [39, 45, 40], [40, 45, 46], [40, 46, 41], [41, 46, 47], [41, 47, 36], [36, 47, 42], [42, 48, 43], [43, 48, 49], [43, 49, 44], [44, 49, 50], [44, 50, 45], [45, 50, 51], [45, 51, 46], [46, 51, 52], [46, 52, 47], [47, 52, 53], [47, 53, 42], [42, 53, 48], [48, 54, 49], [49, 54, 55], [49, 55, 50], [50, 55, 56], [50, 56, 51], [51, 56, 57], [51, 57, 52], [52, 57, 58], [52, 58, 53], [53, 58, 59], [53, 59, 48], [48, 59, 54], [1, 60, 0], [54, 61, 55], [2, 60, 1], [55, 61, 56], [3, 60, 2], [56, 61, 57], [4, 60, 3], [57, 61, 58], [5, 60, 4], [58, 61, 59], [0, 60, 5], [59, 61, 54]], points = [[0.0000000000, 0.0000000000, 1.0000000000], [0.0000000000, -0.8660254038, 0.5000000000], [0.0000000000, -0.8660254038, -0.5000000000], [0.0000000000, -0.0000000000, -1.0000000000], [0.0000000000, 0.8660254038, -0.5000000000], [0.0000000000, 0.8660254038, 0.5000000000], [1.0000000000, 0.0000000000, 1.0000000000], [1.0000000000, -0.8660254038, 0.5000000000], [1.0000000000, -0.8660254038, -0.5000000000], [1.0000000000, -0.0000000000, -1.0000000000], [1.0000000000, 0.8660254038, -0.5000000000], [1.0000000000, 0.8660254038, 0.5000000000], [2.0000000000, 0.0000000000, 1.0000000000], [2.0000000000, -0.8660254038, 0.5000000000], [2.0000000000, -0.8660254038, -0.5000000000], [2.0000000000, -0.0000000000, -1.0000000000], [2.0000000000, 0.8660254038, -0.5000000000], [2.0000000000, 0.8660254038, 0.5000000000], [3.0000000000, 0.0000000000, 1.0000000000], [3.0000000000, -0.8660254038, 0.5000000000], [3.0000000000, -0.8660254038, -0.5000000000], [3.0000000000, -0.0000000000, -1.0000000000], [3.0000000000, 0.8660254038, -0.5000000000], [3.0000000000, 0.8660254038, 0.5000000000], [4.0000000000, 0.0000000000, 1.0000000000], [4.0000000000, -0.8660254038, 0.5000000000], [4.0000000000, -0.8660254038, -0.5000000000], [4.0000000000, -0.0000000000, -1.0000000000], [4.0000000000, 0.8660254038, -0.5000000000], [4.0000000000, 0.8660254038, 0.5000000000], [5.0000000000, 0.0000000000, 1.0000000000], [5.0000000000, -0.8660254038, 0.5000000000], [5.0000000000, -0.8660254038, -0.5000000000], [5.0000000000, -0.0000000000, -1.0000000000], [5.0000000000, 0.8660254038, -0.5000000000], [5.0000000000, 0.8660254038, 0.5000000000], [6.0000000000, 0.0000000000, 1.0000000000], [6.0000000000, -0.8660254038, 0.5000000000], [6.0000000000, -0.8660254038, -0.5000000000], [6.0000000000, -0.0000000000, -1.0000000000], [6.0000000000, 0.8660254038, -0.5000000000], [6.0000000000, 0.8660254038, 0.5000000000], [7.0000000000, 0.0000000000, 1.0000000000], [7.0000000000, -0.8660254038, 0.5000000000], [7.0000000000, -0.8660254038, -0.5000000000], [7.0000000000, -0.0000000000, -1.0000000000], [7.0000000000, 0.8660254038, -0.5000000000], [7.0000000000, 0.8660254038, 0.5000000000], [8.0000000000, 0.0000000000, 1.0000000000], [8.0000000000, -0.8660254038, 0.5000000000], [8.0000000000, -0.8660254038, -0.5000000000], [8.0000000000, -0.0000000000, -1.0000000000], [8.0000000000, 0.8660254038, -0.5000000000], [8.0000000000, 0.8660254038, 0.5000000000], [9.0000000000, 0.0000000000, 1.0000000000], [9.0000000000, -0.8660254038, 0.5000000000], [9.0000000000, -0.8660254038, -0.5000000000], [9.0000000000, -0.0000000000, -1.0000000000], [9.0000000000, 0.8660254038, -0.5000000000], [9.0000000000, 0.8660254038, 0.5000000000], [0.0000000000, -0.0000000000, -0.0000000000], [9.0000000000, -0.0000000000, -0.0000000000]]);
	polyhedron(convexity = 10, faces = [[0, 6, 1], [1, 6, 7], [1, 7, 2], [2, 7, 8], [2, 8, 3], [3, 8, 9], [3, 9, 4], [4, 9, 10], [4, 10, 5], [5, 10, 11], [5, 11, 0], [0, 11, 6], [6, 12, 7], [7, 12, 13], [7, 13, 8], [8, 13, 14], [8, 14, 9], [9, 14, 15], [9, 15, 10], [10, 15, 16], [10, 16, 11], [11, 16, 17], [11, 17, 6], [6, 17, 12], [12, 18, 13], [13, 18, 19], [13, 19, 14], [14, 19, 20], [14, 20, 15], [15, 20, 21], [15, 21, 16], [16, 21, 22], [16, 22, 17], [17, 22, 23], [17, 23, 12], [12, 23, 18], [18, 24, 19], [19, 24, 25], [19, 25, 20], [20, 25, 26], [20, 26, 21], [21, 26, 27], [21, 27, 22], [22, 27, 28], [22, 28, 23], [23, 28, 29], [23, 29, 18], [18, 29, 24], [24, 30, 25], [25, 30, 31], [25, 31, 26], [26, 31, 32], [26, 32, 27], [27, 32, 33], [27, 33, 28], [28, 33, 34], [28, 34, 29], [29, 34, 35], [29, 35, 24], [24, 35, 30], [30, 36, 31], [31, 36, 37], [31, 37, 32], [32, 37, 38], [32, 38, 33], [33, 38, 39], [33, 39, 34], [34, 39, 40], [34, 40, 35], [35, 40, 41], [35, 41, 30], [30, 41, 36], [36, 42, 37], [37, 42, 43], [37, 43, 38], [38, 43, 44], [38, 44, 39], [39, 44, 45], [39, 45, 40], [40, 45, 46], [40, 46, 41], [41, 46, 47], [41, 47, 36], [36, 47, 42], [42, 48, 43], [43, 48, 49], [43, 49, 44], [44, 49, 50], [44, 50, 45], [45, 50, 51], [45, 51, 46], [46, 51, 52], [46, 52, 47], [47, 52, 53], [47, 53, 42], [42, 53, 48], [48, 54, 49], [49, 54, 55], [49, 55, 50], [50, 55, 56], [50, 56, 51], [51, 56, 57], [51, 57, 52], [52, 57, 58], [52, 58, 53], [53, 58, 59], [53, 59, 48], [48, 59, 54], [1, 60, 0], [54, 61, 55], [2, 60, 1], [55, 61, 56], [3, 60, 2], [56, 61, 57], [4, 60, 3], [57, 61, 58], [5, 60, 4], [58, 61, 59], [0, 60, 5], [59, 61, 54]], points = [[0.0000000000, 0.0000000000, 1.0000000000], [0.8660254038, 0.0000000000, 0.5000000000], [0.8660254038, 0.0000000000, -0.5000000000], [0.0000000000, 0.0000000000, -1.0000000000], [-0.8660254038, 0.0000000000, -0.5000000000], [-0.8660254038, 0.0000000000, 0.5000000000], [0.0000000000, 1.0000000000, 1.0000000000], [0.8660254038, 1.0000000000, 0.5000000000], [0.8660254038, 1.0000000000, -0.5000000000], [0.0000000000, 1.0000000000, -1.0000000000], [-0.8660254038, 1.0000000000, -0.5000000000], [-0.8660254038, 1.0000000000, 0.5000000000], [0.0000000000, 2.0000000000, 1.0000000000], [0.8660254038, 2.0000000000, 0.5000000000], [0.8660254038, 2.0000000000, -0.5000000000], [0.0000000000, 2.0000000000, -1.0000000000], [-0.8660254038, 2.0000000000, -0.5000000000], [-0.8660254038, 2.0000000000, 0.5000000000], [0.0000000000, 3.0000000000, 1.0000000000], [0.8660254038, 3.0000000000, 0.5000000000], [0.8660254038, 3.0000000000, -0.5000000000], [0.0000000000, 3.0000000000, -1.0000000000], [-0.8660254038, 3.0000000000, -0.5000000000], [-0.8660254038, 3.0000000000, 0.5000000000], [0.0000000000, 4.0000000000, 1.0000000000], [0.8660254038, 4.0000000000, 0.5000000000], [0.8660254038, 4.0000000000, -0.5000000000], [0.0000000000, 4.0000000000, -1.0000000000], [-0.8660254038, 4.0000000000, -0.5000000000], [-0.8660254038, 4.0000000000, 0.5000000000], [0.0000000000, 5.0000000000, 1.0000000000], [0.8660254038, 5.0000000000, 0.5000000000], [0.8660254038, 5.0000000000, -0.5000000000], [0.0000000000, 5.0000000000, -1.0000000000], [-0.8660254038, 5.0000000000, -0.5000000000], [-0.8660254038, 5.0000000000, 0.5000000000], [0.0000000000, 6.0000000000, 1.0000000000], [0.8660254038, 6.0000000000, 0.5000000000], [0.8660254038, 6.0000000000, -0.5000000000], [0.0000000000, 6.0000000000, -1.0000000000], [-0.8660254038, 6.0000000000, -0.5000000000], [-0.8660254038, 6.0000000000, 0.5000000000], [0.0000000000, 7.0000000000, 1.0000000000], [0.8660254038, 7.0000000000, 0.5000000000], [0.8660254038, 7.0000000000, -0.5000000000], [0.0000000000, 7.0000000000, -1.0000000000], [-0.8660254038, 7.0000000000, -0.5000000000], [-0.8660254038, 7.0000000000, 0.5000000000], [0.0000000000, 8.0000000000, 1.0000000000], [0.8660254038, 8.0000000000, 0.5000000000], [0.8660254038, 8.0000000000, -0.5000000000], [0.0000000000, 8.0000000000, -1.0000000000], [-0.8660254038, 8.0000000000, -0.5000000000], [-0.8660254038, 8.0000000000, 0.5000000000], [0.0000000000, 9.0000000000, 1.0000000000], [0.8660254038, 9.0000000000, 0.5000000000], [0.8660254038, 9.0000000000, -0.5000000000], [0.0000000000, 9.0000000000, -1.0000000000], [-0.8660254038, 9.0000000000, -0.5000000000], [-0.8660254038, 9.0000000000, 0.5000000000], [0.0000000000, 0.0000000000, -0.0000000000], [0.0000000000, 9.0000000000, -0.0000000000]]);
	polyhedron(convexity = 10, faces = [[0, 6, 1], [1, 6, 7], [1, 7, 2], [2, 7, 8], [2, 8, 3], [3, 8, 9], [3, 9, 4], [4, 9, 10], [4, 10, 5], [5, 10, 11], [5, 11, 0], [0, 11, 6], [6, 12, 7], [7, 12, 13], [7, 13, 8], [8, 13, 14], [8, 14, 9], [9, 14, 15], [9, 15, 10], [10, 15, 16], [10, 16, 11], [11, 16, 17], [11, 17, 6], [6, 17, 12], [12, 18, 13], [13, 18, 19], [13, 19, 14], [14, 19, 20], [14, 20, 15], [15, 20, 21], [15, 21, 16], [16, 21, 22], [16, 22, 17], [17, 22, 23], [17, 23, 12], [12, 23, 18], [18, 24, 19], [19, 24, 25], [19, 25, 20], [20, 25, 26], [20, 26, 21], [21, 26, 27], [21, 27, 22], [22, 27, 28], [22, 28, 23], [23, 28, 29], [23, 29, 18], [18, 29, 24], [24, 30, 25], [25, 30, 31], [25, 31, 26], [26, 31, 32], [26, 32, 27], [27, 32, 33], [27, 33, 28], [28, 33, 34], [28, 34, 29], [29, 34, 35], [29, 35, 24], [24, 35, 30], [30, 36, 31], [31, 36, 37], [31, 37, 32], [32, 37, 38], [32, 38, 33], [33, 38, 39], [33, 39, 34], [34, 39, 40], [34, 40, 35], [35, 40, 41], [35, 41, 30], [30, 41, 36], [36, 42, 37], [37, 42, 43], [37, 43, 38], [38, 43, 44], [38, 44, 39], [39, 44, 45], [39, 45, 40], [40, 45, 46], [40, 46, 41], [41, 46, 47], [41, 47, 36], [36, 47, 42], [42, 48, 43], [43, 48, 49], [43, 49, 44], [44, 49, 50], [44, 50, 45], [45, 50, 51], [45, 51, 46], [46, 51, 52], [46, 52, 47], [47, 52, 53], [47, 53, 42], [42, 53, 48], [48, 54, 49], [49, 54, 55], [49, 55, 50], [50, 55, 56], [50, 56, 51], [51, 56, 57], [51, 57, 52], [52, 57, 58], [52, 58, 53], [53, 58, 59], [53, 59, 48], [48, 59, 54], [1, 60, 0], [54, 61, 55], [2, 60, 1], [55, 61, 56], [3, 60, 2], [56, 61, 57], [4, 60, 3], [57, 61, 58], [5, 60, 4], [58, 61, 59], [0, 60, 5], [59, 61, 54]], points = [[1.0000000000, 0.0000000000, 0.0000000000], [0.5000000000, 0.8660254038, 0.0000000000], [-0.5000000000, 0.8660254038, 0.0000000000], [-1.0000000000, 0.0000000000, 0.0000000000], [-0.5000000000, -0.8660254038, 0.0000000000], [0.5000000000, -0.8660254038, 0.0000000000], [1.0000000000, 0.0000000000, 1.0000000000], [0.5000000000, 0.8660254038, 1.0000000000], [-0.5000000000, 0.8660254038, 1.0000000000], [-1.0000000000, 0.0000000000, 1.0000000000], [-0.5000000000, -0.8660254038, 1.0000000000], [0.5000000000, -0.8660254038, 1.0000000000], [1.0000000000, 0.0000000000, 2.0000000000], [0.5000000000, 0.8660254038, 2.0000000000], [-0.5000000000, 0.8660254038, 2.0000000000], [-1.0000000000, 0.0000000000, 2.0000000000], [-0.5000000000, -0.8660254038, 2.0000000000], [0.5000000000, -0.8660254038, 2.0000000000], [1.0000000000, 0.0000000000, 3.0000000000], [0.5000000000, 0.8660254038, 3.0000000000], [-0.5000000000, 0.8660254038, 3.0000000000], [-1.0000000000, 0.0000000000, 3.0000000000], [-0.5000000000, -0.8660254038, 3.0000000000], [0.5000000000, -0.8660254038, 3.0000000000], [1.0000000000, 0.0000000000, 4.0000000000], [0.5000000000, 0.8660254038, 4.0000000000], [-0.5000000000, 0.8660254038, 4.0000000000], [-1.0000000000, 0.0000000000, 4.0000000000], [-0.5000000000, -0.8660254038, 4.0000000000], [0.5000000000, -0.8660254038, 4.0000000000], [1.0000000000, 0.0000000000, 5.0000000000], [0.5000000000, 0.8660254038, 5.0000000000], [-0.5000000000, 0.8660254038, 5.0000000000], [-1.0000000000, 0.0000000000, 5.0000000000], [-0.5000000000, -0.8660254038, 5.0000000000], [0.5000000000, -0.8660254038, 5.0000000000], [1.0000000000, 0.0000000000, 6.0000000000], [0.5000000000, 0.8660254038, 6.0000000000], [-0.5000000000, 0.8660254038, 6.0000000000], [-1.0000000000, 0.0000000000, 6.0000000000], [-0.5000000000, -0.8660254038, 6.0000000000], [0.5000000000, -0.8660254038, 6.0000000000], [1.0000000000, 0.0000000000, 7.0000000000], [0.5000000000, 0.8660254038, 7.0000000000], [-0.5000000000, 0.8660254038, 7.0000000000], [-1.0000000000, 0.0000000000, 7.0000000000], [-0.5000000000, -0.8660254038, 7.0000000000], [0.5000000000, -0.8660254038, 7.0000000000], [1.0000000000, 0.0000000000, 8.0000000000], [0.5000000000, 0.8660254038, 8.0000000000], [-0.5000000000, 0.8660254038, 8.0000000000], [-1.0000000000, 0.0000000000, 8.0000000000], [-0.5000000000, -0.8660254038, 8.0000000000], [0.5000000000, -0.8660254038, 8.0000000000], [1.0000000000, 0.0000000000, 9.0000000000], [0.5000000000, 0.8660254038, 9.0000000000], [-0.5000000000, 0.8660254038, 9.0000000000], [-1.0000000000, 0.0000000000, 9.0000000000], [-0.5000000000, -0.8660254038, 9.0000000000], [0.5000000000, -0.8660254038, 9.0000000000], [-0.0000000000, 0.0000000000, 0.0000000000], [-0.0000000000, 0.0000000000, 9.0000000000]]);
}
